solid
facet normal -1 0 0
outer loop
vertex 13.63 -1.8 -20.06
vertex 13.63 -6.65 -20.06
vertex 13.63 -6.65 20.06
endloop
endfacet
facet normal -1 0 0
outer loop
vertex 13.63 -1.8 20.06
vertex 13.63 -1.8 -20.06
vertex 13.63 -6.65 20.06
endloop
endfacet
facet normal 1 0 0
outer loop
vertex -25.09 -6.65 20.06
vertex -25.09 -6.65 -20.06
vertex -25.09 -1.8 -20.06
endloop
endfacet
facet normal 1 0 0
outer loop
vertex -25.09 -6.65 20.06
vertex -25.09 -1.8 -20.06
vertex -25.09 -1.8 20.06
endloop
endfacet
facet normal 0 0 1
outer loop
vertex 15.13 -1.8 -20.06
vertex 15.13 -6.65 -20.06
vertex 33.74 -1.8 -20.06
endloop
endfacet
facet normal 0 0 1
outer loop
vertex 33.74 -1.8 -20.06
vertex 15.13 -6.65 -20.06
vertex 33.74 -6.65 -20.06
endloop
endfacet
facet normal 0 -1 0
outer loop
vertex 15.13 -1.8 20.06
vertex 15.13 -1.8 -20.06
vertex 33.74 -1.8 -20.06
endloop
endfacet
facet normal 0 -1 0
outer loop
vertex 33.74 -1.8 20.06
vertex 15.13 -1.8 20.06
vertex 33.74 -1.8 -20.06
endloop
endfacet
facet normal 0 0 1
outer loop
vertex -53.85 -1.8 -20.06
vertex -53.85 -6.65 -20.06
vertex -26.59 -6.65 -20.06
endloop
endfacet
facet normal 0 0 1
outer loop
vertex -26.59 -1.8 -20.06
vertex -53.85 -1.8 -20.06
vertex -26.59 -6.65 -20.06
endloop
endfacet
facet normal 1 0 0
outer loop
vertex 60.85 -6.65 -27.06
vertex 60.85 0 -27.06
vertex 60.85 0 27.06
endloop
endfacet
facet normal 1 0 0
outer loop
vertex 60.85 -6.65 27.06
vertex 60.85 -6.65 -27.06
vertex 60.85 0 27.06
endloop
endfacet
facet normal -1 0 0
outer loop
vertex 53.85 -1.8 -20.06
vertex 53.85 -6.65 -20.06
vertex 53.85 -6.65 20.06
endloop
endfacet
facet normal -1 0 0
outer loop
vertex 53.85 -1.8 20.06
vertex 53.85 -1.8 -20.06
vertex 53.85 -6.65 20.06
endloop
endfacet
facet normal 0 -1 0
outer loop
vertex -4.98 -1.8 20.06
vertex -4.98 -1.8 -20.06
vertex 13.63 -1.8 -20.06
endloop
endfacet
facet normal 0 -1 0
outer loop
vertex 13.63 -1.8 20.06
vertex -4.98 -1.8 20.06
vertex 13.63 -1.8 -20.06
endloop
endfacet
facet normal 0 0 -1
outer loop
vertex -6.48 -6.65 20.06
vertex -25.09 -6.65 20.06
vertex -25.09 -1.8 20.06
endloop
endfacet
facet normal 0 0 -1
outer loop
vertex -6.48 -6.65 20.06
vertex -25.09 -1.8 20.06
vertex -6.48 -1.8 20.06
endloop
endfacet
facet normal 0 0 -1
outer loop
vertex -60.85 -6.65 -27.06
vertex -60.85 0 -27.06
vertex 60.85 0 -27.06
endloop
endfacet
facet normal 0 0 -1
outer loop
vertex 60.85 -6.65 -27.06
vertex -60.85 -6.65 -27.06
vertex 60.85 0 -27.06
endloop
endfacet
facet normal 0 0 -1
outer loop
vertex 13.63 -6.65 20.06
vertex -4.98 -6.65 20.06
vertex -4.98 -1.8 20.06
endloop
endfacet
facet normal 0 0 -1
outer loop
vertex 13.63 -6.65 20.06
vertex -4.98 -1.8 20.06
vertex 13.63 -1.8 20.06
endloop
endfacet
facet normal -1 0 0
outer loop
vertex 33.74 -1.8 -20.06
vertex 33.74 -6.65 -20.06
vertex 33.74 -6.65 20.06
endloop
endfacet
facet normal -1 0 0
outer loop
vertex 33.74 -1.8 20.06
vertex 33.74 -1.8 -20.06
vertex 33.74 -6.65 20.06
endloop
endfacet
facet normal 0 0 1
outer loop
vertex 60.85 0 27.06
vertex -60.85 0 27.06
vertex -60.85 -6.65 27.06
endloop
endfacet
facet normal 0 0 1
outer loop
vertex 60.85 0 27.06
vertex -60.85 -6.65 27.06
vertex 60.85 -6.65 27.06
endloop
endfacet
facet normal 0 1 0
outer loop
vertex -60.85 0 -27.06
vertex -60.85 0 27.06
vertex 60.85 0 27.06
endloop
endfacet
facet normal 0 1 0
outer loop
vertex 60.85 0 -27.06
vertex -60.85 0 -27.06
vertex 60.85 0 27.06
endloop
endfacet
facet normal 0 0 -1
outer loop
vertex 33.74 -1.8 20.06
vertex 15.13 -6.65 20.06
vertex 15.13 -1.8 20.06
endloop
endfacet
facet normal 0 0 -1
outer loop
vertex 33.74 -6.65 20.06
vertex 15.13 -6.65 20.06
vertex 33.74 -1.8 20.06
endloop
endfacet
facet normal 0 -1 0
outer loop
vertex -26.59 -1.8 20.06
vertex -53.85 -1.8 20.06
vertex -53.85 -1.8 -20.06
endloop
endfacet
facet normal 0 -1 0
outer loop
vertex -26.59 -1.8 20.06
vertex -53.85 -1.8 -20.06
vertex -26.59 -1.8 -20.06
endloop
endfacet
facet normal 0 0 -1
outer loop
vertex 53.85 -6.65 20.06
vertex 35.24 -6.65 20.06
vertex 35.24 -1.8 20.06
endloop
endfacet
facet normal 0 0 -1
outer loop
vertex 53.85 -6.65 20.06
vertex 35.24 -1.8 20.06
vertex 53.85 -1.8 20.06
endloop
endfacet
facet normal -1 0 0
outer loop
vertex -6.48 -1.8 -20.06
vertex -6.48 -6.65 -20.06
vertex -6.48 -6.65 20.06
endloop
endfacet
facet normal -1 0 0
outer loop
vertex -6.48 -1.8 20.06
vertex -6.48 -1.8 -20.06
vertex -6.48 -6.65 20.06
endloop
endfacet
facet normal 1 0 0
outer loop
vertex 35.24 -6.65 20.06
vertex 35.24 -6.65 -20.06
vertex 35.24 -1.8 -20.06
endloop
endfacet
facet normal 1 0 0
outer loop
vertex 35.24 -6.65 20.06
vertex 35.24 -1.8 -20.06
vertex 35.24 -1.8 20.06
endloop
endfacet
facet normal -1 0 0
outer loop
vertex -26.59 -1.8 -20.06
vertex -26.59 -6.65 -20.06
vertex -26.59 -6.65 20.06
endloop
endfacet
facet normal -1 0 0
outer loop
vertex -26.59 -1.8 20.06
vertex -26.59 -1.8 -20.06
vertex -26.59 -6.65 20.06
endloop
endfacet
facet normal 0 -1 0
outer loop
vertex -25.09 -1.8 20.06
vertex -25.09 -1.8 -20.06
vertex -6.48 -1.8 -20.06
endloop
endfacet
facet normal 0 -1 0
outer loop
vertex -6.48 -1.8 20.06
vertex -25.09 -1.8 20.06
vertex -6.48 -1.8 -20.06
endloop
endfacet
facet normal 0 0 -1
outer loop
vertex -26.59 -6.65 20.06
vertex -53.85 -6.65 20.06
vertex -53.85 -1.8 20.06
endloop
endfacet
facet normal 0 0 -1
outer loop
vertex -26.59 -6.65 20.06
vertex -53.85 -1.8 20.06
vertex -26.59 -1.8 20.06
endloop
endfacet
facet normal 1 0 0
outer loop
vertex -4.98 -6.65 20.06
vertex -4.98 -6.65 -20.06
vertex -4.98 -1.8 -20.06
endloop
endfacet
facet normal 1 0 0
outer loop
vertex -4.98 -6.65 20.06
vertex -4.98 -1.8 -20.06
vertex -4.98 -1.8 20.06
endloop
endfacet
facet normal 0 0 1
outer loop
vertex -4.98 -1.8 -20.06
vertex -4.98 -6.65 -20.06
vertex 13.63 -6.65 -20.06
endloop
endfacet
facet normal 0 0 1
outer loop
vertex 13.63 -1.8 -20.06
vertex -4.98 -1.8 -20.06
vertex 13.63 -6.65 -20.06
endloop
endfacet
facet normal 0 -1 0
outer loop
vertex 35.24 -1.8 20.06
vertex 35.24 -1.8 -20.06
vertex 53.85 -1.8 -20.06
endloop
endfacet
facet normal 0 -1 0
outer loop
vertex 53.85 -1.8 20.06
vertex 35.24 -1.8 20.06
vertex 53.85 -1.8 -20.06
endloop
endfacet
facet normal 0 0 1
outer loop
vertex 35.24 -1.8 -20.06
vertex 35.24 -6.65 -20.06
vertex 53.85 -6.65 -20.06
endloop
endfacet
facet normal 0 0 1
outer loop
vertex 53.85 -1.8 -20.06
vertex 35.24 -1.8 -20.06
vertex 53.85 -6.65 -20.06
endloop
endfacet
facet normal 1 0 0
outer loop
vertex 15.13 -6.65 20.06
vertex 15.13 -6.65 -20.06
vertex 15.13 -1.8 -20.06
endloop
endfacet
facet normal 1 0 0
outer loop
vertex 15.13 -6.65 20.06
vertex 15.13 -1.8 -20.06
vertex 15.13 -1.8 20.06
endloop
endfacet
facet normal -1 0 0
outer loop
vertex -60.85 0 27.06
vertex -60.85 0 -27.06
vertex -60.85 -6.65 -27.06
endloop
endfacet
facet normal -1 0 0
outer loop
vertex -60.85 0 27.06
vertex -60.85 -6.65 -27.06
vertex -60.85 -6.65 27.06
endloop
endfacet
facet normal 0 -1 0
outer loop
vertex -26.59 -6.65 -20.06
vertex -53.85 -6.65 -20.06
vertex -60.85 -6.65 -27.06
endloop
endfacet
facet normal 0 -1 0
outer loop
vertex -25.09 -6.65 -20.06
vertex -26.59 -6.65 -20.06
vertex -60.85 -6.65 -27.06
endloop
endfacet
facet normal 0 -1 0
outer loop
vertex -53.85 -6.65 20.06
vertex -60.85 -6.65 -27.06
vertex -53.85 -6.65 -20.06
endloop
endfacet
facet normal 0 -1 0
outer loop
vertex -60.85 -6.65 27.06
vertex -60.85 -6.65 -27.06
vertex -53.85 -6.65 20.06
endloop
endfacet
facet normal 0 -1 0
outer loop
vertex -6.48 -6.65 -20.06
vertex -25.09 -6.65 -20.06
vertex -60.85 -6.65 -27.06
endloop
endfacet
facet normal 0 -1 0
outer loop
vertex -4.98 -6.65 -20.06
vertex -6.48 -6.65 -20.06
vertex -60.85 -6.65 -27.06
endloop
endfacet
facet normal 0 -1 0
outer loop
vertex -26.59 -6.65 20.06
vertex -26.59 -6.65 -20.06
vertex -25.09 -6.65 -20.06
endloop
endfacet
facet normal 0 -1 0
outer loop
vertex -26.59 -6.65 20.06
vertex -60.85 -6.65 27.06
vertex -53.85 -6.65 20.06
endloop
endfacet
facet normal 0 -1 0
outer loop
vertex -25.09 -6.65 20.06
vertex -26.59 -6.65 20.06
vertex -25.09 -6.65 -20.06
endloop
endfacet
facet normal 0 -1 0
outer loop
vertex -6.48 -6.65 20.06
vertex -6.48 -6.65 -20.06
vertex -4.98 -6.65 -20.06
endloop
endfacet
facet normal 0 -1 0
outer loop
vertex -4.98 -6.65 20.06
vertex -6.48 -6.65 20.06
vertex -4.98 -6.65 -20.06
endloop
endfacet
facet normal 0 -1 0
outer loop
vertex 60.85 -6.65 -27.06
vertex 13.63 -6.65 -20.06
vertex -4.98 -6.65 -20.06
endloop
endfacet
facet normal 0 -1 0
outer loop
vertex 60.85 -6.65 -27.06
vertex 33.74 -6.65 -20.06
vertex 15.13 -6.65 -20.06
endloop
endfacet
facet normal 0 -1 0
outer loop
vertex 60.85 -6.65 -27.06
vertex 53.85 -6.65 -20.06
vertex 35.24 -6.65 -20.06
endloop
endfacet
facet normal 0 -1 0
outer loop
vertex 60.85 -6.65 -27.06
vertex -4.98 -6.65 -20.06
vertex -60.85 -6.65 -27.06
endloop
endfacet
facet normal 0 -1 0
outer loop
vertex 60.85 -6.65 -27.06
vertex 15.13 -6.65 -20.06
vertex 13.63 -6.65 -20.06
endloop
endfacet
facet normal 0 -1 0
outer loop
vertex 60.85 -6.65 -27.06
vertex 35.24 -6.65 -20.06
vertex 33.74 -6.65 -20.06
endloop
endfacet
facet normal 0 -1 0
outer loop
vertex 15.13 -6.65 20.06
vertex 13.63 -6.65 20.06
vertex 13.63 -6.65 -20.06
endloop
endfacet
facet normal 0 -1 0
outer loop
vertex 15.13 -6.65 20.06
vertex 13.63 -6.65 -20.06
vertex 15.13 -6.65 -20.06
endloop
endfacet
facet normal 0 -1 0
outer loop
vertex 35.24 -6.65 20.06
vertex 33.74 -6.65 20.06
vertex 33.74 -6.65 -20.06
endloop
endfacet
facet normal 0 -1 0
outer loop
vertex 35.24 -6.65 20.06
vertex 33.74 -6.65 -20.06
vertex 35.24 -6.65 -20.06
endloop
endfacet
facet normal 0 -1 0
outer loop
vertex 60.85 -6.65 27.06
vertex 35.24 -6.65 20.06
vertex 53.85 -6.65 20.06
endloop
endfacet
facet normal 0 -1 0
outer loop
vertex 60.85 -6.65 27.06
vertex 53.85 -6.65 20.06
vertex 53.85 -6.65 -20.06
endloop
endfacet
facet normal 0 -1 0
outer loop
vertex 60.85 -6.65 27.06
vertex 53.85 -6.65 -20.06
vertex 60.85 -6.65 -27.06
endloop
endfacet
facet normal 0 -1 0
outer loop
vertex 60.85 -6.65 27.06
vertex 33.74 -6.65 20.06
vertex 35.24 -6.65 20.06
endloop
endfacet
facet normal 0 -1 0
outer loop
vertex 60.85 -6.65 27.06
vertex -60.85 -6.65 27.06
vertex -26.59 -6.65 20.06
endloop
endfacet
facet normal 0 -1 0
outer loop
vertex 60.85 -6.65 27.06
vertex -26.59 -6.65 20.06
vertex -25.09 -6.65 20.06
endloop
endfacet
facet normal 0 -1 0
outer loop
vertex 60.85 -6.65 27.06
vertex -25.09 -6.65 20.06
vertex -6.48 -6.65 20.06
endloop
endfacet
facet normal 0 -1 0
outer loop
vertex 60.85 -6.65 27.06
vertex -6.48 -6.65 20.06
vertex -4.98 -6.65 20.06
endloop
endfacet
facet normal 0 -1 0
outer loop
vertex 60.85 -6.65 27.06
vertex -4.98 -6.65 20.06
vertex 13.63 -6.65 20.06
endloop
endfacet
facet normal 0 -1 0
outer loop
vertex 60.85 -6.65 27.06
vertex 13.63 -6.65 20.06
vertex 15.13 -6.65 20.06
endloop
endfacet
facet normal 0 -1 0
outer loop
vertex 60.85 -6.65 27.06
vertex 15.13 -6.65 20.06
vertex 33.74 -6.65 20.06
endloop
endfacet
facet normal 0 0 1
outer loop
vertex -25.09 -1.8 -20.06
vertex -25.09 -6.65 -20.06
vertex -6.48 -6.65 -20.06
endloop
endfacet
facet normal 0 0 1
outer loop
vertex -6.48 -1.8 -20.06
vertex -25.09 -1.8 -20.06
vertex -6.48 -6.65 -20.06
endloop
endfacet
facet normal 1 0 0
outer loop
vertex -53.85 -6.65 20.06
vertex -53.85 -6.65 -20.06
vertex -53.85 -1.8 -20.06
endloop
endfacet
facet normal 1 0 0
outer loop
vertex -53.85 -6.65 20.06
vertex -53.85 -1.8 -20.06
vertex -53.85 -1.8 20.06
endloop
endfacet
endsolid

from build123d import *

# Parameters (mm, degrees)
F0_W     = 121.7
F0_H     = 54.12
F1_DEPTH = 6.65
F2_W     = 27.26
F2_H     = 40.12
F2_W_2   = 18.61
F3_DEPTH = 4.85


with BuildPart() as f1:
    # F0 (on Front) → F1 (new body)
    with BuildSketch(Plane.XZ):
        Rectangle(F0_W, F0_H)
    extrude(amount=F1_DEPTH)

    # F2 (on face) → F3 (cut)
    with BuildSketch(Plane.XZ.offset(6.65)):
        with Locations((-40.22, 0)):
            Rectangle(F2_W, F2_H)
        with Locations((-15.785, 0)):
            Rectangle(F2_W_2, F2_H)
        with Locations((4.325, 0)):
            Rectangle(F2_W_2, F2_H)
        with Locations((24.435, 0)):
            Rectangle(F2_W_2, F2_H)
        with Locations((44.545, 0)):
            Rectangle(F2_W_2, F2_H)
    extrude(amount=-F3_DEPTH, mode=Mode.SUBTRACT)


solid = f1.part
